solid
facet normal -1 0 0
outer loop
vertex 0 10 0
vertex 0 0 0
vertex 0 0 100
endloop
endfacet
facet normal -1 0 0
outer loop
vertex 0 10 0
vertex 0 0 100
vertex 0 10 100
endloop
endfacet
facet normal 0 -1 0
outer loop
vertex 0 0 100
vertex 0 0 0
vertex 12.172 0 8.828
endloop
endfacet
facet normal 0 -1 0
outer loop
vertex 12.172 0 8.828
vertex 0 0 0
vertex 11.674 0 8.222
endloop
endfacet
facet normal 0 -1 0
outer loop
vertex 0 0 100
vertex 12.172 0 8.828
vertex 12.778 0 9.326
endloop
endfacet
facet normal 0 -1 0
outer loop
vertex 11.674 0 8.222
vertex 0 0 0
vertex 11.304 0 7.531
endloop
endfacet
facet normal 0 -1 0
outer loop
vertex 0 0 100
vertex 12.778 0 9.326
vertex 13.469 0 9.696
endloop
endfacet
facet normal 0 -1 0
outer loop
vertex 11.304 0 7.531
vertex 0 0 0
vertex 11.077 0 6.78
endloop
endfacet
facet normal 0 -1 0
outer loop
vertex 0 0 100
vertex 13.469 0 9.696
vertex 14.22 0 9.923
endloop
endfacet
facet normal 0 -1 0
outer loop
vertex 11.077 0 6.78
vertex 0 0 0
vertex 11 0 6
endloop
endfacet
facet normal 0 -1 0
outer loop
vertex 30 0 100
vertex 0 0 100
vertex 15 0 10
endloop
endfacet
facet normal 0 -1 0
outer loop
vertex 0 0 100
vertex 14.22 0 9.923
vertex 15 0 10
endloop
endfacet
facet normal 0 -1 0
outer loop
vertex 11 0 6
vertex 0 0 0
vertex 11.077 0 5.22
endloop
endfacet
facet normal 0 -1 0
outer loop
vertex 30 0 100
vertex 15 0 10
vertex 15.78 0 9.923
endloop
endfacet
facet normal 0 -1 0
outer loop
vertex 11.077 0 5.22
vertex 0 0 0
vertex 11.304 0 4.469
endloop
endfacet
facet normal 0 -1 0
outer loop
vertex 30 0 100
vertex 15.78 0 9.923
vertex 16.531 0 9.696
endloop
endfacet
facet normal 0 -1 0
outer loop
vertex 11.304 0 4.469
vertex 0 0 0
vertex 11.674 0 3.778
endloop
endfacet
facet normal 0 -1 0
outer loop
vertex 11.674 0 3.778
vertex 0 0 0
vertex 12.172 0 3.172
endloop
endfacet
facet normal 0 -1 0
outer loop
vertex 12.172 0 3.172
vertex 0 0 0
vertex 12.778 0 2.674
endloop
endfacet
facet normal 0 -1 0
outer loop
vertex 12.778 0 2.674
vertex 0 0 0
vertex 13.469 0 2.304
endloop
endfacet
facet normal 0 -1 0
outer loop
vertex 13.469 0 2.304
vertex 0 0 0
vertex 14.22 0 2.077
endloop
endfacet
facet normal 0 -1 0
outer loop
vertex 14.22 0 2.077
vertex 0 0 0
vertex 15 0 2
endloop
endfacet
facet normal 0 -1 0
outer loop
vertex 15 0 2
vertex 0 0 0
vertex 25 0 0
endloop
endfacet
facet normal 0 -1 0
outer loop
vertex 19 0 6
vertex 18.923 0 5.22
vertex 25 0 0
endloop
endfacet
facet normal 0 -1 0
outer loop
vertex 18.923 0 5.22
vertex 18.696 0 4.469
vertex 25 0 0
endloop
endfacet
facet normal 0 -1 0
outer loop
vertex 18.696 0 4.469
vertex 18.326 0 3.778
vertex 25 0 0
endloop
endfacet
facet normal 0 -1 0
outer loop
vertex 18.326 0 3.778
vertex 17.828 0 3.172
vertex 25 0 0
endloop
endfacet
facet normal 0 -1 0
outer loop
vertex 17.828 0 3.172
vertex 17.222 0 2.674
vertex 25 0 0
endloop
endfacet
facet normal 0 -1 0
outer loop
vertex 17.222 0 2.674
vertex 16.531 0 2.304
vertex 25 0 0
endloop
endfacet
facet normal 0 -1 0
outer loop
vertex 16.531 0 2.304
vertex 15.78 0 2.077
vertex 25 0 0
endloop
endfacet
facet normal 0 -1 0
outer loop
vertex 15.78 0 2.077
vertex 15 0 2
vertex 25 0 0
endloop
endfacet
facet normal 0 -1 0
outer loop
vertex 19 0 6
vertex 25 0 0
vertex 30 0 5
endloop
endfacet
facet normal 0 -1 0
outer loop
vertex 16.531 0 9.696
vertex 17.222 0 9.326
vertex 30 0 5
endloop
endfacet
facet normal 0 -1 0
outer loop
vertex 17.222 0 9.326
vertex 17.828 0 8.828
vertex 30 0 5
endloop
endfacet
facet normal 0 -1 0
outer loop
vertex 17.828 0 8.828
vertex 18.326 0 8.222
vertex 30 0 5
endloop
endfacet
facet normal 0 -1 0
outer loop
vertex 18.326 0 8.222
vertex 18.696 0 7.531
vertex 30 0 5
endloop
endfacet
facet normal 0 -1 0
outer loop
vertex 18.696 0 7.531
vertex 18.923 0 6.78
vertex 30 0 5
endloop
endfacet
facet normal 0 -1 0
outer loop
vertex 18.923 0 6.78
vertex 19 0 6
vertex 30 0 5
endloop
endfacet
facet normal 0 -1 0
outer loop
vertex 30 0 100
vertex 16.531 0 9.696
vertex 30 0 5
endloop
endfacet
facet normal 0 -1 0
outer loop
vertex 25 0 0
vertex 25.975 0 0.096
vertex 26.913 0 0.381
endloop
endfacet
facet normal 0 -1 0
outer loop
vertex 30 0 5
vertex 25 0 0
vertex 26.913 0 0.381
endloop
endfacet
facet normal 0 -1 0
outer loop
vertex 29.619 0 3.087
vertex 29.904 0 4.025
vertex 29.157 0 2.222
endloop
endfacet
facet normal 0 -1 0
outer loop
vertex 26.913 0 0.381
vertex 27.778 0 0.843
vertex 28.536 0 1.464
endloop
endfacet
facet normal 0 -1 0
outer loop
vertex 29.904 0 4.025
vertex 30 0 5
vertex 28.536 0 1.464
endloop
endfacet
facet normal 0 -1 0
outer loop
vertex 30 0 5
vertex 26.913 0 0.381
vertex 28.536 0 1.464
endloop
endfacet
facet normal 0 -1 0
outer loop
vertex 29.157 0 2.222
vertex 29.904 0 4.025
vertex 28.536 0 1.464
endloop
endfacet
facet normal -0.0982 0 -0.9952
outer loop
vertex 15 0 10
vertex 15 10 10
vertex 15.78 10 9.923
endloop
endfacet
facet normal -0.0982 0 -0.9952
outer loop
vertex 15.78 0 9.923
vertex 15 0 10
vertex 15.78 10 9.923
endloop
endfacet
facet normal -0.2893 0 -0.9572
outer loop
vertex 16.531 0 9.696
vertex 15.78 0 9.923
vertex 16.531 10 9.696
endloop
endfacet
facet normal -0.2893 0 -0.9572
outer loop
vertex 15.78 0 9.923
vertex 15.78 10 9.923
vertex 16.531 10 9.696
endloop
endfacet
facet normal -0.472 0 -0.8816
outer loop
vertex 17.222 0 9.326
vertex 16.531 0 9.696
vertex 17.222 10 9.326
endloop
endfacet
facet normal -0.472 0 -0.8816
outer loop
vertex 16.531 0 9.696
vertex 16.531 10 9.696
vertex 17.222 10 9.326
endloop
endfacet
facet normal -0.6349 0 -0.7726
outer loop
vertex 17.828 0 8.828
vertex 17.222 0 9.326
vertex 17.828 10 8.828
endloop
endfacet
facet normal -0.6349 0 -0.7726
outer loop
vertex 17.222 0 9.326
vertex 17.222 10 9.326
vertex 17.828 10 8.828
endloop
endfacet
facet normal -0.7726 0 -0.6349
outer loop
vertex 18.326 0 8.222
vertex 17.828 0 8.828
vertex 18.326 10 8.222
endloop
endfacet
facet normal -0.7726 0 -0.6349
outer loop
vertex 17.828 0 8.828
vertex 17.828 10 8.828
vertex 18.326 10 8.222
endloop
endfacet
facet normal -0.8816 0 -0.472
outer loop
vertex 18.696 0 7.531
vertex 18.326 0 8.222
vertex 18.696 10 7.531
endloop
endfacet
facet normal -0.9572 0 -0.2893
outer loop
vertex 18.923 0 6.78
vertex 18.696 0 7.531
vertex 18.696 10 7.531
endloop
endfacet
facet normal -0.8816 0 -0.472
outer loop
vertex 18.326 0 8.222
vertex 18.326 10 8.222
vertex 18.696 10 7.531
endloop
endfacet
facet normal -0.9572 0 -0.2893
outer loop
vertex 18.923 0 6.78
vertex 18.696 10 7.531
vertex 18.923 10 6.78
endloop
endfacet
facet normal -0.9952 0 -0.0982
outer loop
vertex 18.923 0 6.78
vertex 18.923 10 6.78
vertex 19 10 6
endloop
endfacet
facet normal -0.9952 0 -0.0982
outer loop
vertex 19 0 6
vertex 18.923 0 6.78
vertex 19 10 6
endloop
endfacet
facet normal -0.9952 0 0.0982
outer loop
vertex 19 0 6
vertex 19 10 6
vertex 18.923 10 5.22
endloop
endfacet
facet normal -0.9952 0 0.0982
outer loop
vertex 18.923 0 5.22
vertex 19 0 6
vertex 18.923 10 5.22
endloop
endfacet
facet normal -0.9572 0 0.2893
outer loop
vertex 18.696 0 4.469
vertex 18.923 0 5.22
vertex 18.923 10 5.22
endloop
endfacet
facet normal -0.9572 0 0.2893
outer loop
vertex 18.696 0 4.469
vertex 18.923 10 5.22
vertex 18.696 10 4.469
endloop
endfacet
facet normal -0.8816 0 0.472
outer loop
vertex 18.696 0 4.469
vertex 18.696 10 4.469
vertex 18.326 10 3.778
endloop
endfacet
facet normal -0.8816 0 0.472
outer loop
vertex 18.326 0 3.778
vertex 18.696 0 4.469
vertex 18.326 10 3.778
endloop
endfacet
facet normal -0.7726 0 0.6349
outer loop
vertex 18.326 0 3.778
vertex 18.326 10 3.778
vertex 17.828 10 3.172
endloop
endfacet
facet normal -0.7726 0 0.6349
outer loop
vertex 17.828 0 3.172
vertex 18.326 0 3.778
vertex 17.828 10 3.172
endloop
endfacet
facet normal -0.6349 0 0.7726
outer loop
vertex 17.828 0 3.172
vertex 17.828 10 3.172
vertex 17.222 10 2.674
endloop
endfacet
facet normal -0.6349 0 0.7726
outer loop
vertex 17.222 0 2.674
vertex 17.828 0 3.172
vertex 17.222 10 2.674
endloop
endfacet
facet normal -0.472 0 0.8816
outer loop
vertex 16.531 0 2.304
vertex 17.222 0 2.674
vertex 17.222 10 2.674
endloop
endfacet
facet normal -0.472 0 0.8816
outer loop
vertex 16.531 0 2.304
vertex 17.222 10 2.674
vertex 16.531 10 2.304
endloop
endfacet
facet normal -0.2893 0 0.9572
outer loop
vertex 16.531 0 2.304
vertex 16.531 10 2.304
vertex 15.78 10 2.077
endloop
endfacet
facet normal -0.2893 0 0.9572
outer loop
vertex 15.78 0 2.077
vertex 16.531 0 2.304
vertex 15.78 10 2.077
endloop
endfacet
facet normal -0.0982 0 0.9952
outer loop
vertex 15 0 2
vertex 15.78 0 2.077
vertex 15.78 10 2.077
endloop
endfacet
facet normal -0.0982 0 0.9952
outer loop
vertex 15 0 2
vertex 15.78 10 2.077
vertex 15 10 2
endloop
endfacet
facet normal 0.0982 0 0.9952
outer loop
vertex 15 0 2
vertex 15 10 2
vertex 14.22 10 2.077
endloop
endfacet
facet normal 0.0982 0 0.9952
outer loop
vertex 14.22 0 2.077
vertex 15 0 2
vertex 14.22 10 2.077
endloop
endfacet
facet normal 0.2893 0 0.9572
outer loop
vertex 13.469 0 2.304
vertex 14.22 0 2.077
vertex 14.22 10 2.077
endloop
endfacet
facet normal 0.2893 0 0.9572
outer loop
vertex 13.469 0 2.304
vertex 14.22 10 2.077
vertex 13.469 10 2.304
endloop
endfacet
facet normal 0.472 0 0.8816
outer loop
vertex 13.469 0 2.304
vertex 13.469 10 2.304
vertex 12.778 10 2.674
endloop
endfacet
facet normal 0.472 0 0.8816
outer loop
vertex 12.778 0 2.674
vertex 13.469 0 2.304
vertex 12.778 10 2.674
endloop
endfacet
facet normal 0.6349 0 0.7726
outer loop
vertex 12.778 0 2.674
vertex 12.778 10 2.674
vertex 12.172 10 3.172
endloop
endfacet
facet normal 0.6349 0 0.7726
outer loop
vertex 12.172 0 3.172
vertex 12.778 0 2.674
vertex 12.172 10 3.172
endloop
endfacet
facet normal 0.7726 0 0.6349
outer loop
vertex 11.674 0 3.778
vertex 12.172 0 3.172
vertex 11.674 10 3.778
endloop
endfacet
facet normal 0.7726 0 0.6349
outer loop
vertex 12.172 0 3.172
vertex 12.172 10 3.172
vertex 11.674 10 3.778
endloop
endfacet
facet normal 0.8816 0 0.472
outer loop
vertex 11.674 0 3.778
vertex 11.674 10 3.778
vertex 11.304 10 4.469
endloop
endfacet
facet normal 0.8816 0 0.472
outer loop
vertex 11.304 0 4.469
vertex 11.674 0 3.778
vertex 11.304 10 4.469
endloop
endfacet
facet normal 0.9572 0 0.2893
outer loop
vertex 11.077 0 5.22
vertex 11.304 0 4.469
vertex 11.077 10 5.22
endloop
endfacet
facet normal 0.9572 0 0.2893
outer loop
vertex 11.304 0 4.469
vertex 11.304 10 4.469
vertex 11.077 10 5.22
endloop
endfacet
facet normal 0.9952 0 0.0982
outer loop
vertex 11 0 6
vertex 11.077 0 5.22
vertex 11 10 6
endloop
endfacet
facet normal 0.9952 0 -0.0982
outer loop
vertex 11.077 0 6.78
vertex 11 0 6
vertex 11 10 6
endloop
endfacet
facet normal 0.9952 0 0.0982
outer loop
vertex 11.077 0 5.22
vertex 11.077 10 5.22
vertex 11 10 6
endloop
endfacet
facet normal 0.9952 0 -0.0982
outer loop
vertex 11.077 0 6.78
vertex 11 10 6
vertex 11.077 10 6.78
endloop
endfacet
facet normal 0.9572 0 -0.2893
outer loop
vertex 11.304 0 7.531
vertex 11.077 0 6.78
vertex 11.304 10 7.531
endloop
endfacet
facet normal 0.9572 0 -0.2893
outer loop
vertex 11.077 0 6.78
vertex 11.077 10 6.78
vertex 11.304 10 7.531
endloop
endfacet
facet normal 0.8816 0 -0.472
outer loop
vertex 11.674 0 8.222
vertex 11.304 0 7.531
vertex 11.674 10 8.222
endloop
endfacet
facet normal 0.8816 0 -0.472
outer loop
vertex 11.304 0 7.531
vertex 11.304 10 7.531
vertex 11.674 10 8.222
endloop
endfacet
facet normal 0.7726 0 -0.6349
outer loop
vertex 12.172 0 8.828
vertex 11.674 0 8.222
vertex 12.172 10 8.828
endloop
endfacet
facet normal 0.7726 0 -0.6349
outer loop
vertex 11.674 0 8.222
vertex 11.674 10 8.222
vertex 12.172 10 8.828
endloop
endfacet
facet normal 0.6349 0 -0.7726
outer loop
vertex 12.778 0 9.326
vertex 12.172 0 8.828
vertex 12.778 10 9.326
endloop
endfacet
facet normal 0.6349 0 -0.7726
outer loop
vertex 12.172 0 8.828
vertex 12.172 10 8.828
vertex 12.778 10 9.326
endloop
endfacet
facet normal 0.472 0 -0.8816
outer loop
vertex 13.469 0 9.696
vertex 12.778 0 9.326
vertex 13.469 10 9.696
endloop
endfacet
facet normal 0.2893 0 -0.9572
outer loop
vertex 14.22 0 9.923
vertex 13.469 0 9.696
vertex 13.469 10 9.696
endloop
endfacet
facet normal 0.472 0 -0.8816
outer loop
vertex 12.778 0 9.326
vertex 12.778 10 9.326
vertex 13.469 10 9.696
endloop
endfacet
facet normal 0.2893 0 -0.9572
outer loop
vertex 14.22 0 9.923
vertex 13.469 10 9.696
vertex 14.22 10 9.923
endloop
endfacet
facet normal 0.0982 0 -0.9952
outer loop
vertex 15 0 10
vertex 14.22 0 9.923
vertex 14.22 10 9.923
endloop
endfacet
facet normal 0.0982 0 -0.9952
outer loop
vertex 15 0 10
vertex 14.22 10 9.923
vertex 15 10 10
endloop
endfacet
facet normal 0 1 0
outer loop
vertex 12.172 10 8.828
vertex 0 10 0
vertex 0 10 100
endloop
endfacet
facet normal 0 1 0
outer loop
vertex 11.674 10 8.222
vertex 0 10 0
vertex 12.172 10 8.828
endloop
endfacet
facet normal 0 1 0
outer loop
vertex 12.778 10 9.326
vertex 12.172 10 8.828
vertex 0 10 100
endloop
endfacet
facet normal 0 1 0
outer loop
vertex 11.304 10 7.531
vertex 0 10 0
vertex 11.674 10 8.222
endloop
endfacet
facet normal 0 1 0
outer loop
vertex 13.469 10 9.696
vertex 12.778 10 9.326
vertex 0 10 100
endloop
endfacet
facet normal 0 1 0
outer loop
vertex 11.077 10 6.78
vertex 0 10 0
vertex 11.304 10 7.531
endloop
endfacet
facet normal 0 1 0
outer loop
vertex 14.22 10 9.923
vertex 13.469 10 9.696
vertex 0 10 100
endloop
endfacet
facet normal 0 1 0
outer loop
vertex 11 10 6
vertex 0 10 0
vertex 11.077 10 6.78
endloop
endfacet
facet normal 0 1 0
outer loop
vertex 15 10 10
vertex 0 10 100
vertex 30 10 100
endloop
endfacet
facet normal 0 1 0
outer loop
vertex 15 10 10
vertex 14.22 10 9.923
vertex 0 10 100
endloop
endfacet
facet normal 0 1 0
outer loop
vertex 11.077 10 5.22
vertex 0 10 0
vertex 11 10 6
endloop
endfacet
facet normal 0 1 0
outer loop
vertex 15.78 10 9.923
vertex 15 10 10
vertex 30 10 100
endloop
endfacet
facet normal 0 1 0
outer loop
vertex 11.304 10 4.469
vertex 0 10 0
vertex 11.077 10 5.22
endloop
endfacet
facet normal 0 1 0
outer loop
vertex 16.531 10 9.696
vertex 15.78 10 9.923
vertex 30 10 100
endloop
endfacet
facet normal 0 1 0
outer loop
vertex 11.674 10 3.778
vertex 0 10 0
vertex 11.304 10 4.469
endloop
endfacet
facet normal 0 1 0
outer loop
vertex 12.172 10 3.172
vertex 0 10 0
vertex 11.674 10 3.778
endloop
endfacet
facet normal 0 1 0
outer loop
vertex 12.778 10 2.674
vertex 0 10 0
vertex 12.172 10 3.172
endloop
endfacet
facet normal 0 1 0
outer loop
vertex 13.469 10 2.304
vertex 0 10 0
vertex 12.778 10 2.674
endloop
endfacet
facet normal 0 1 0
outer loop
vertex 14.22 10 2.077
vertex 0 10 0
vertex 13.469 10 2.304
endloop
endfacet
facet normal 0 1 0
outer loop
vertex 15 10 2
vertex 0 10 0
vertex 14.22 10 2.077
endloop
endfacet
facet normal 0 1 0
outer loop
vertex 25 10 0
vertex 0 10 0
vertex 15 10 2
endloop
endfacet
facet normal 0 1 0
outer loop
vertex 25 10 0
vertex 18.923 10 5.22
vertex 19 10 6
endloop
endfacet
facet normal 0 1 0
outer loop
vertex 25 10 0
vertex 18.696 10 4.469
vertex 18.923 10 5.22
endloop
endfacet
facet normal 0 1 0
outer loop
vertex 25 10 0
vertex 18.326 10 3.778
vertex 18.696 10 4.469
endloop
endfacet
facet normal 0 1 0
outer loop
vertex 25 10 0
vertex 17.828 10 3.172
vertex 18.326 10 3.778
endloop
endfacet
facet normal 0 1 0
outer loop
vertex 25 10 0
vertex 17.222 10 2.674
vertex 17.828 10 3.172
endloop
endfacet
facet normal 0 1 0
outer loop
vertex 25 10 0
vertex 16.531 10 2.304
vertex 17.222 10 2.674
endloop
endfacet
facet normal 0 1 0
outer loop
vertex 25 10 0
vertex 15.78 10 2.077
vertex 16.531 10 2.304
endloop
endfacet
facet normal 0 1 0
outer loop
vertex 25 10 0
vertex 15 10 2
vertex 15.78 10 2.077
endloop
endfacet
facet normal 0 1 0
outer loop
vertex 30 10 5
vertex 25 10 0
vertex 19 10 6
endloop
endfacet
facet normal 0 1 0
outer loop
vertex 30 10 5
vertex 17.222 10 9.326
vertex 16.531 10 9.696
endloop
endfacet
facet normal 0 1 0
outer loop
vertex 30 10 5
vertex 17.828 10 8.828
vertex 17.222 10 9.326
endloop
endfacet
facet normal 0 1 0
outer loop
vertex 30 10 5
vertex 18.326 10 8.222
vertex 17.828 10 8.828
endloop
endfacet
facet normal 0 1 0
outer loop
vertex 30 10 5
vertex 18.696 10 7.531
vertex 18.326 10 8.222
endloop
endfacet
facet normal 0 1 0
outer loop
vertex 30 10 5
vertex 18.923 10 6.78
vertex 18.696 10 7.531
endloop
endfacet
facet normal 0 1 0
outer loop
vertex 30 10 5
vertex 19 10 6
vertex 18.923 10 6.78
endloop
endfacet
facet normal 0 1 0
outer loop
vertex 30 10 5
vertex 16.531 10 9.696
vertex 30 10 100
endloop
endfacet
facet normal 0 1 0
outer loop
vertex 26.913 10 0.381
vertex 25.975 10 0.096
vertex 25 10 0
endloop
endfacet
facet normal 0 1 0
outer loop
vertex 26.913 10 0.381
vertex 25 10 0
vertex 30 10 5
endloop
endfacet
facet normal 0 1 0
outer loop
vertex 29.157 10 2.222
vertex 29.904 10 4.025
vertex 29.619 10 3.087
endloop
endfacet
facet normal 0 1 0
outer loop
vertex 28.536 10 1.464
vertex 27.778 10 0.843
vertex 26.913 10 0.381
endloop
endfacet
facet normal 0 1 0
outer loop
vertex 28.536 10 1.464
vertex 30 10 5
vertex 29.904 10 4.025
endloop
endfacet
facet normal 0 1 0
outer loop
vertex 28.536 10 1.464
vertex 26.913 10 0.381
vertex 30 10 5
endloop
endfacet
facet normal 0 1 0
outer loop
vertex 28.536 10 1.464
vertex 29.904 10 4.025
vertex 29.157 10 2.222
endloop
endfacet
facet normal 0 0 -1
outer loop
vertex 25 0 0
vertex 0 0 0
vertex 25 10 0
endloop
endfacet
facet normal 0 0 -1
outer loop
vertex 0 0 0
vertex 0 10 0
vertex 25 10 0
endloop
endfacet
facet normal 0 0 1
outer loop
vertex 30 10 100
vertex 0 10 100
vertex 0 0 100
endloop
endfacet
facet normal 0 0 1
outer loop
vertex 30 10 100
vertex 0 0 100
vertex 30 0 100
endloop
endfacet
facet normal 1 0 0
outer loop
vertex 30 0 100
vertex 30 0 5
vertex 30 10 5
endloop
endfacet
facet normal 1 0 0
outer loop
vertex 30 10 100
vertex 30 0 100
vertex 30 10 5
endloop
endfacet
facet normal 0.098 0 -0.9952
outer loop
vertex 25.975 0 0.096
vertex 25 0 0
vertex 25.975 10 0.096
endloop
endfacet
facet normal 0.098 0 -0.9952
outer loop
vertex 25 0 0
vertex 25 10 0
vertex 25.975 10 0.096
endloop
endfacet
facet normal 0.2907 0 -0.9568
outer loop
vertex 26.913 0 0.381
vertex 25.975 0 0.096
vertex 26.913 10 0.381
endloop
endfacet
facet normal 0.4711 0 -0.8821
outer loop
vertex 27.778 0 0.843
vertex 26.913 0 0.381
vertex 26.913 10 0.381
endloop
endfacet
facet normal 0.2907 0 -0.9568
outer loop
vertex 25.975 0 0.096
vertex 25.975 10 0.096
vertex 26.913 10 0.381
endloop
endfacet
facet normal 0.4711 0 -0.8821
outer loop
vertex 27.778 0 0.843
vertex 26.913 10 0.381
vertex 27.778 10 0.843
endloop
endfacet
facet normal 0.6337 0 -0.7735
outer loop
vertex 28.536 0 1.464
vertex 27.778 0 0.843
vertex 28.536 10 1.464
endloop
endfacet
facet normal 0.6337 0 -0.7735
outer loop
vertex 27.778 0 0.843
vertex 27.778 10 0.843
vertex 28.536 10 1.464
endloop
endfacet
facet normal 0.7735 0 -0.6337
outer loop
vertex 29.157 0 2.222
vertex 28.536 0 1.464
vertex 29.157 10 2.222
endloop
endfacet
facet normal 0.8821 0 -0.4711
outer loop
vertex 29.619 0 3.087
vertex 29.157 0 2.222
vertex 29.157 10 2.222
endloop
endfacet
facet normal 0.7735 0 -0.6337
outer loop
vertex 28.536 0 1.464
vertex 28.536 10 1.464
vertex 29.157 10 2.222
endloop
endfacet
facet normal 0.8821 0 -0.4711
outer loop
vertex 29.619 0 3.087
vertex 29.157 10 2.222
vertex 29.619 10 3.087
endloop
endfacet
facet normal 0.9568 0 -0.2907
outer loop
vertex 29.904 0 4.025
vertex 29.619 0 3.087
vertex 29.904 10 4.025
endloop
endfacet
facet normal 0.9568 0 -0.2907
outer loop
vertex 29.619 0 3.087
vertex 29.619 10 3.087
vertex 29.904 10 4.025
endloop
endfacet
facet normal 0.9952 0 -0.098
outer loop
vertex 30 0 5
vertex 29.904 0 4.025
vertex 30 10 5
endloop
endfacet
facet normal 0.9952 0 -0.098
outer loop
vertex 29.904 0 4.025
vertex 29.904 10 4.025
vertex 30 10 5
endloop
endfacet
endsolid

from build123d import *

# Parameters (mm, degrees)
SKETCH2_W           = 30
SKETCH2_H           = 10
BOSS_EXTRUDE1_DEPTH = 100
SKETCH3_R           = 4
CUT_EXTRUDE1_DEPTH  = 30
FILLET1_R           = 5


with BuildPart() as part:
    # Sketch2 → Boss-Extrude1 (new body)
    with BuildSketch(Plane.XY):
        with Locations((15, 5)):
            Rectangle(SKETCH2_W, SKETCH2_H)
    extrude(amount=BOSS_EXTRUDE1_DEPTH)

    # Sketch3 → Cut-Extrude1 (cut)
    with BuildSketch(Plane(origin=(0, 10, 0), x_dir=(1, 0, 0), z_dir=(0, 1, 0))):
        with Locations(Location((15, -6, 0), (0, 0, 270))):
            Circle(SKETCH3_R)
    extrude(amount=-CUT_EXTRUDE1_DEPTH, mode=Mode.SUBTRACT)

    # Fillet1
    fillet1_edges = [part.edges().sort_by_distance(p)[0] for p in [
        (30, 5, 0),
    ]]
    fillet(fillet1_edges, radius=FILLET1_R)


solid = part.part
